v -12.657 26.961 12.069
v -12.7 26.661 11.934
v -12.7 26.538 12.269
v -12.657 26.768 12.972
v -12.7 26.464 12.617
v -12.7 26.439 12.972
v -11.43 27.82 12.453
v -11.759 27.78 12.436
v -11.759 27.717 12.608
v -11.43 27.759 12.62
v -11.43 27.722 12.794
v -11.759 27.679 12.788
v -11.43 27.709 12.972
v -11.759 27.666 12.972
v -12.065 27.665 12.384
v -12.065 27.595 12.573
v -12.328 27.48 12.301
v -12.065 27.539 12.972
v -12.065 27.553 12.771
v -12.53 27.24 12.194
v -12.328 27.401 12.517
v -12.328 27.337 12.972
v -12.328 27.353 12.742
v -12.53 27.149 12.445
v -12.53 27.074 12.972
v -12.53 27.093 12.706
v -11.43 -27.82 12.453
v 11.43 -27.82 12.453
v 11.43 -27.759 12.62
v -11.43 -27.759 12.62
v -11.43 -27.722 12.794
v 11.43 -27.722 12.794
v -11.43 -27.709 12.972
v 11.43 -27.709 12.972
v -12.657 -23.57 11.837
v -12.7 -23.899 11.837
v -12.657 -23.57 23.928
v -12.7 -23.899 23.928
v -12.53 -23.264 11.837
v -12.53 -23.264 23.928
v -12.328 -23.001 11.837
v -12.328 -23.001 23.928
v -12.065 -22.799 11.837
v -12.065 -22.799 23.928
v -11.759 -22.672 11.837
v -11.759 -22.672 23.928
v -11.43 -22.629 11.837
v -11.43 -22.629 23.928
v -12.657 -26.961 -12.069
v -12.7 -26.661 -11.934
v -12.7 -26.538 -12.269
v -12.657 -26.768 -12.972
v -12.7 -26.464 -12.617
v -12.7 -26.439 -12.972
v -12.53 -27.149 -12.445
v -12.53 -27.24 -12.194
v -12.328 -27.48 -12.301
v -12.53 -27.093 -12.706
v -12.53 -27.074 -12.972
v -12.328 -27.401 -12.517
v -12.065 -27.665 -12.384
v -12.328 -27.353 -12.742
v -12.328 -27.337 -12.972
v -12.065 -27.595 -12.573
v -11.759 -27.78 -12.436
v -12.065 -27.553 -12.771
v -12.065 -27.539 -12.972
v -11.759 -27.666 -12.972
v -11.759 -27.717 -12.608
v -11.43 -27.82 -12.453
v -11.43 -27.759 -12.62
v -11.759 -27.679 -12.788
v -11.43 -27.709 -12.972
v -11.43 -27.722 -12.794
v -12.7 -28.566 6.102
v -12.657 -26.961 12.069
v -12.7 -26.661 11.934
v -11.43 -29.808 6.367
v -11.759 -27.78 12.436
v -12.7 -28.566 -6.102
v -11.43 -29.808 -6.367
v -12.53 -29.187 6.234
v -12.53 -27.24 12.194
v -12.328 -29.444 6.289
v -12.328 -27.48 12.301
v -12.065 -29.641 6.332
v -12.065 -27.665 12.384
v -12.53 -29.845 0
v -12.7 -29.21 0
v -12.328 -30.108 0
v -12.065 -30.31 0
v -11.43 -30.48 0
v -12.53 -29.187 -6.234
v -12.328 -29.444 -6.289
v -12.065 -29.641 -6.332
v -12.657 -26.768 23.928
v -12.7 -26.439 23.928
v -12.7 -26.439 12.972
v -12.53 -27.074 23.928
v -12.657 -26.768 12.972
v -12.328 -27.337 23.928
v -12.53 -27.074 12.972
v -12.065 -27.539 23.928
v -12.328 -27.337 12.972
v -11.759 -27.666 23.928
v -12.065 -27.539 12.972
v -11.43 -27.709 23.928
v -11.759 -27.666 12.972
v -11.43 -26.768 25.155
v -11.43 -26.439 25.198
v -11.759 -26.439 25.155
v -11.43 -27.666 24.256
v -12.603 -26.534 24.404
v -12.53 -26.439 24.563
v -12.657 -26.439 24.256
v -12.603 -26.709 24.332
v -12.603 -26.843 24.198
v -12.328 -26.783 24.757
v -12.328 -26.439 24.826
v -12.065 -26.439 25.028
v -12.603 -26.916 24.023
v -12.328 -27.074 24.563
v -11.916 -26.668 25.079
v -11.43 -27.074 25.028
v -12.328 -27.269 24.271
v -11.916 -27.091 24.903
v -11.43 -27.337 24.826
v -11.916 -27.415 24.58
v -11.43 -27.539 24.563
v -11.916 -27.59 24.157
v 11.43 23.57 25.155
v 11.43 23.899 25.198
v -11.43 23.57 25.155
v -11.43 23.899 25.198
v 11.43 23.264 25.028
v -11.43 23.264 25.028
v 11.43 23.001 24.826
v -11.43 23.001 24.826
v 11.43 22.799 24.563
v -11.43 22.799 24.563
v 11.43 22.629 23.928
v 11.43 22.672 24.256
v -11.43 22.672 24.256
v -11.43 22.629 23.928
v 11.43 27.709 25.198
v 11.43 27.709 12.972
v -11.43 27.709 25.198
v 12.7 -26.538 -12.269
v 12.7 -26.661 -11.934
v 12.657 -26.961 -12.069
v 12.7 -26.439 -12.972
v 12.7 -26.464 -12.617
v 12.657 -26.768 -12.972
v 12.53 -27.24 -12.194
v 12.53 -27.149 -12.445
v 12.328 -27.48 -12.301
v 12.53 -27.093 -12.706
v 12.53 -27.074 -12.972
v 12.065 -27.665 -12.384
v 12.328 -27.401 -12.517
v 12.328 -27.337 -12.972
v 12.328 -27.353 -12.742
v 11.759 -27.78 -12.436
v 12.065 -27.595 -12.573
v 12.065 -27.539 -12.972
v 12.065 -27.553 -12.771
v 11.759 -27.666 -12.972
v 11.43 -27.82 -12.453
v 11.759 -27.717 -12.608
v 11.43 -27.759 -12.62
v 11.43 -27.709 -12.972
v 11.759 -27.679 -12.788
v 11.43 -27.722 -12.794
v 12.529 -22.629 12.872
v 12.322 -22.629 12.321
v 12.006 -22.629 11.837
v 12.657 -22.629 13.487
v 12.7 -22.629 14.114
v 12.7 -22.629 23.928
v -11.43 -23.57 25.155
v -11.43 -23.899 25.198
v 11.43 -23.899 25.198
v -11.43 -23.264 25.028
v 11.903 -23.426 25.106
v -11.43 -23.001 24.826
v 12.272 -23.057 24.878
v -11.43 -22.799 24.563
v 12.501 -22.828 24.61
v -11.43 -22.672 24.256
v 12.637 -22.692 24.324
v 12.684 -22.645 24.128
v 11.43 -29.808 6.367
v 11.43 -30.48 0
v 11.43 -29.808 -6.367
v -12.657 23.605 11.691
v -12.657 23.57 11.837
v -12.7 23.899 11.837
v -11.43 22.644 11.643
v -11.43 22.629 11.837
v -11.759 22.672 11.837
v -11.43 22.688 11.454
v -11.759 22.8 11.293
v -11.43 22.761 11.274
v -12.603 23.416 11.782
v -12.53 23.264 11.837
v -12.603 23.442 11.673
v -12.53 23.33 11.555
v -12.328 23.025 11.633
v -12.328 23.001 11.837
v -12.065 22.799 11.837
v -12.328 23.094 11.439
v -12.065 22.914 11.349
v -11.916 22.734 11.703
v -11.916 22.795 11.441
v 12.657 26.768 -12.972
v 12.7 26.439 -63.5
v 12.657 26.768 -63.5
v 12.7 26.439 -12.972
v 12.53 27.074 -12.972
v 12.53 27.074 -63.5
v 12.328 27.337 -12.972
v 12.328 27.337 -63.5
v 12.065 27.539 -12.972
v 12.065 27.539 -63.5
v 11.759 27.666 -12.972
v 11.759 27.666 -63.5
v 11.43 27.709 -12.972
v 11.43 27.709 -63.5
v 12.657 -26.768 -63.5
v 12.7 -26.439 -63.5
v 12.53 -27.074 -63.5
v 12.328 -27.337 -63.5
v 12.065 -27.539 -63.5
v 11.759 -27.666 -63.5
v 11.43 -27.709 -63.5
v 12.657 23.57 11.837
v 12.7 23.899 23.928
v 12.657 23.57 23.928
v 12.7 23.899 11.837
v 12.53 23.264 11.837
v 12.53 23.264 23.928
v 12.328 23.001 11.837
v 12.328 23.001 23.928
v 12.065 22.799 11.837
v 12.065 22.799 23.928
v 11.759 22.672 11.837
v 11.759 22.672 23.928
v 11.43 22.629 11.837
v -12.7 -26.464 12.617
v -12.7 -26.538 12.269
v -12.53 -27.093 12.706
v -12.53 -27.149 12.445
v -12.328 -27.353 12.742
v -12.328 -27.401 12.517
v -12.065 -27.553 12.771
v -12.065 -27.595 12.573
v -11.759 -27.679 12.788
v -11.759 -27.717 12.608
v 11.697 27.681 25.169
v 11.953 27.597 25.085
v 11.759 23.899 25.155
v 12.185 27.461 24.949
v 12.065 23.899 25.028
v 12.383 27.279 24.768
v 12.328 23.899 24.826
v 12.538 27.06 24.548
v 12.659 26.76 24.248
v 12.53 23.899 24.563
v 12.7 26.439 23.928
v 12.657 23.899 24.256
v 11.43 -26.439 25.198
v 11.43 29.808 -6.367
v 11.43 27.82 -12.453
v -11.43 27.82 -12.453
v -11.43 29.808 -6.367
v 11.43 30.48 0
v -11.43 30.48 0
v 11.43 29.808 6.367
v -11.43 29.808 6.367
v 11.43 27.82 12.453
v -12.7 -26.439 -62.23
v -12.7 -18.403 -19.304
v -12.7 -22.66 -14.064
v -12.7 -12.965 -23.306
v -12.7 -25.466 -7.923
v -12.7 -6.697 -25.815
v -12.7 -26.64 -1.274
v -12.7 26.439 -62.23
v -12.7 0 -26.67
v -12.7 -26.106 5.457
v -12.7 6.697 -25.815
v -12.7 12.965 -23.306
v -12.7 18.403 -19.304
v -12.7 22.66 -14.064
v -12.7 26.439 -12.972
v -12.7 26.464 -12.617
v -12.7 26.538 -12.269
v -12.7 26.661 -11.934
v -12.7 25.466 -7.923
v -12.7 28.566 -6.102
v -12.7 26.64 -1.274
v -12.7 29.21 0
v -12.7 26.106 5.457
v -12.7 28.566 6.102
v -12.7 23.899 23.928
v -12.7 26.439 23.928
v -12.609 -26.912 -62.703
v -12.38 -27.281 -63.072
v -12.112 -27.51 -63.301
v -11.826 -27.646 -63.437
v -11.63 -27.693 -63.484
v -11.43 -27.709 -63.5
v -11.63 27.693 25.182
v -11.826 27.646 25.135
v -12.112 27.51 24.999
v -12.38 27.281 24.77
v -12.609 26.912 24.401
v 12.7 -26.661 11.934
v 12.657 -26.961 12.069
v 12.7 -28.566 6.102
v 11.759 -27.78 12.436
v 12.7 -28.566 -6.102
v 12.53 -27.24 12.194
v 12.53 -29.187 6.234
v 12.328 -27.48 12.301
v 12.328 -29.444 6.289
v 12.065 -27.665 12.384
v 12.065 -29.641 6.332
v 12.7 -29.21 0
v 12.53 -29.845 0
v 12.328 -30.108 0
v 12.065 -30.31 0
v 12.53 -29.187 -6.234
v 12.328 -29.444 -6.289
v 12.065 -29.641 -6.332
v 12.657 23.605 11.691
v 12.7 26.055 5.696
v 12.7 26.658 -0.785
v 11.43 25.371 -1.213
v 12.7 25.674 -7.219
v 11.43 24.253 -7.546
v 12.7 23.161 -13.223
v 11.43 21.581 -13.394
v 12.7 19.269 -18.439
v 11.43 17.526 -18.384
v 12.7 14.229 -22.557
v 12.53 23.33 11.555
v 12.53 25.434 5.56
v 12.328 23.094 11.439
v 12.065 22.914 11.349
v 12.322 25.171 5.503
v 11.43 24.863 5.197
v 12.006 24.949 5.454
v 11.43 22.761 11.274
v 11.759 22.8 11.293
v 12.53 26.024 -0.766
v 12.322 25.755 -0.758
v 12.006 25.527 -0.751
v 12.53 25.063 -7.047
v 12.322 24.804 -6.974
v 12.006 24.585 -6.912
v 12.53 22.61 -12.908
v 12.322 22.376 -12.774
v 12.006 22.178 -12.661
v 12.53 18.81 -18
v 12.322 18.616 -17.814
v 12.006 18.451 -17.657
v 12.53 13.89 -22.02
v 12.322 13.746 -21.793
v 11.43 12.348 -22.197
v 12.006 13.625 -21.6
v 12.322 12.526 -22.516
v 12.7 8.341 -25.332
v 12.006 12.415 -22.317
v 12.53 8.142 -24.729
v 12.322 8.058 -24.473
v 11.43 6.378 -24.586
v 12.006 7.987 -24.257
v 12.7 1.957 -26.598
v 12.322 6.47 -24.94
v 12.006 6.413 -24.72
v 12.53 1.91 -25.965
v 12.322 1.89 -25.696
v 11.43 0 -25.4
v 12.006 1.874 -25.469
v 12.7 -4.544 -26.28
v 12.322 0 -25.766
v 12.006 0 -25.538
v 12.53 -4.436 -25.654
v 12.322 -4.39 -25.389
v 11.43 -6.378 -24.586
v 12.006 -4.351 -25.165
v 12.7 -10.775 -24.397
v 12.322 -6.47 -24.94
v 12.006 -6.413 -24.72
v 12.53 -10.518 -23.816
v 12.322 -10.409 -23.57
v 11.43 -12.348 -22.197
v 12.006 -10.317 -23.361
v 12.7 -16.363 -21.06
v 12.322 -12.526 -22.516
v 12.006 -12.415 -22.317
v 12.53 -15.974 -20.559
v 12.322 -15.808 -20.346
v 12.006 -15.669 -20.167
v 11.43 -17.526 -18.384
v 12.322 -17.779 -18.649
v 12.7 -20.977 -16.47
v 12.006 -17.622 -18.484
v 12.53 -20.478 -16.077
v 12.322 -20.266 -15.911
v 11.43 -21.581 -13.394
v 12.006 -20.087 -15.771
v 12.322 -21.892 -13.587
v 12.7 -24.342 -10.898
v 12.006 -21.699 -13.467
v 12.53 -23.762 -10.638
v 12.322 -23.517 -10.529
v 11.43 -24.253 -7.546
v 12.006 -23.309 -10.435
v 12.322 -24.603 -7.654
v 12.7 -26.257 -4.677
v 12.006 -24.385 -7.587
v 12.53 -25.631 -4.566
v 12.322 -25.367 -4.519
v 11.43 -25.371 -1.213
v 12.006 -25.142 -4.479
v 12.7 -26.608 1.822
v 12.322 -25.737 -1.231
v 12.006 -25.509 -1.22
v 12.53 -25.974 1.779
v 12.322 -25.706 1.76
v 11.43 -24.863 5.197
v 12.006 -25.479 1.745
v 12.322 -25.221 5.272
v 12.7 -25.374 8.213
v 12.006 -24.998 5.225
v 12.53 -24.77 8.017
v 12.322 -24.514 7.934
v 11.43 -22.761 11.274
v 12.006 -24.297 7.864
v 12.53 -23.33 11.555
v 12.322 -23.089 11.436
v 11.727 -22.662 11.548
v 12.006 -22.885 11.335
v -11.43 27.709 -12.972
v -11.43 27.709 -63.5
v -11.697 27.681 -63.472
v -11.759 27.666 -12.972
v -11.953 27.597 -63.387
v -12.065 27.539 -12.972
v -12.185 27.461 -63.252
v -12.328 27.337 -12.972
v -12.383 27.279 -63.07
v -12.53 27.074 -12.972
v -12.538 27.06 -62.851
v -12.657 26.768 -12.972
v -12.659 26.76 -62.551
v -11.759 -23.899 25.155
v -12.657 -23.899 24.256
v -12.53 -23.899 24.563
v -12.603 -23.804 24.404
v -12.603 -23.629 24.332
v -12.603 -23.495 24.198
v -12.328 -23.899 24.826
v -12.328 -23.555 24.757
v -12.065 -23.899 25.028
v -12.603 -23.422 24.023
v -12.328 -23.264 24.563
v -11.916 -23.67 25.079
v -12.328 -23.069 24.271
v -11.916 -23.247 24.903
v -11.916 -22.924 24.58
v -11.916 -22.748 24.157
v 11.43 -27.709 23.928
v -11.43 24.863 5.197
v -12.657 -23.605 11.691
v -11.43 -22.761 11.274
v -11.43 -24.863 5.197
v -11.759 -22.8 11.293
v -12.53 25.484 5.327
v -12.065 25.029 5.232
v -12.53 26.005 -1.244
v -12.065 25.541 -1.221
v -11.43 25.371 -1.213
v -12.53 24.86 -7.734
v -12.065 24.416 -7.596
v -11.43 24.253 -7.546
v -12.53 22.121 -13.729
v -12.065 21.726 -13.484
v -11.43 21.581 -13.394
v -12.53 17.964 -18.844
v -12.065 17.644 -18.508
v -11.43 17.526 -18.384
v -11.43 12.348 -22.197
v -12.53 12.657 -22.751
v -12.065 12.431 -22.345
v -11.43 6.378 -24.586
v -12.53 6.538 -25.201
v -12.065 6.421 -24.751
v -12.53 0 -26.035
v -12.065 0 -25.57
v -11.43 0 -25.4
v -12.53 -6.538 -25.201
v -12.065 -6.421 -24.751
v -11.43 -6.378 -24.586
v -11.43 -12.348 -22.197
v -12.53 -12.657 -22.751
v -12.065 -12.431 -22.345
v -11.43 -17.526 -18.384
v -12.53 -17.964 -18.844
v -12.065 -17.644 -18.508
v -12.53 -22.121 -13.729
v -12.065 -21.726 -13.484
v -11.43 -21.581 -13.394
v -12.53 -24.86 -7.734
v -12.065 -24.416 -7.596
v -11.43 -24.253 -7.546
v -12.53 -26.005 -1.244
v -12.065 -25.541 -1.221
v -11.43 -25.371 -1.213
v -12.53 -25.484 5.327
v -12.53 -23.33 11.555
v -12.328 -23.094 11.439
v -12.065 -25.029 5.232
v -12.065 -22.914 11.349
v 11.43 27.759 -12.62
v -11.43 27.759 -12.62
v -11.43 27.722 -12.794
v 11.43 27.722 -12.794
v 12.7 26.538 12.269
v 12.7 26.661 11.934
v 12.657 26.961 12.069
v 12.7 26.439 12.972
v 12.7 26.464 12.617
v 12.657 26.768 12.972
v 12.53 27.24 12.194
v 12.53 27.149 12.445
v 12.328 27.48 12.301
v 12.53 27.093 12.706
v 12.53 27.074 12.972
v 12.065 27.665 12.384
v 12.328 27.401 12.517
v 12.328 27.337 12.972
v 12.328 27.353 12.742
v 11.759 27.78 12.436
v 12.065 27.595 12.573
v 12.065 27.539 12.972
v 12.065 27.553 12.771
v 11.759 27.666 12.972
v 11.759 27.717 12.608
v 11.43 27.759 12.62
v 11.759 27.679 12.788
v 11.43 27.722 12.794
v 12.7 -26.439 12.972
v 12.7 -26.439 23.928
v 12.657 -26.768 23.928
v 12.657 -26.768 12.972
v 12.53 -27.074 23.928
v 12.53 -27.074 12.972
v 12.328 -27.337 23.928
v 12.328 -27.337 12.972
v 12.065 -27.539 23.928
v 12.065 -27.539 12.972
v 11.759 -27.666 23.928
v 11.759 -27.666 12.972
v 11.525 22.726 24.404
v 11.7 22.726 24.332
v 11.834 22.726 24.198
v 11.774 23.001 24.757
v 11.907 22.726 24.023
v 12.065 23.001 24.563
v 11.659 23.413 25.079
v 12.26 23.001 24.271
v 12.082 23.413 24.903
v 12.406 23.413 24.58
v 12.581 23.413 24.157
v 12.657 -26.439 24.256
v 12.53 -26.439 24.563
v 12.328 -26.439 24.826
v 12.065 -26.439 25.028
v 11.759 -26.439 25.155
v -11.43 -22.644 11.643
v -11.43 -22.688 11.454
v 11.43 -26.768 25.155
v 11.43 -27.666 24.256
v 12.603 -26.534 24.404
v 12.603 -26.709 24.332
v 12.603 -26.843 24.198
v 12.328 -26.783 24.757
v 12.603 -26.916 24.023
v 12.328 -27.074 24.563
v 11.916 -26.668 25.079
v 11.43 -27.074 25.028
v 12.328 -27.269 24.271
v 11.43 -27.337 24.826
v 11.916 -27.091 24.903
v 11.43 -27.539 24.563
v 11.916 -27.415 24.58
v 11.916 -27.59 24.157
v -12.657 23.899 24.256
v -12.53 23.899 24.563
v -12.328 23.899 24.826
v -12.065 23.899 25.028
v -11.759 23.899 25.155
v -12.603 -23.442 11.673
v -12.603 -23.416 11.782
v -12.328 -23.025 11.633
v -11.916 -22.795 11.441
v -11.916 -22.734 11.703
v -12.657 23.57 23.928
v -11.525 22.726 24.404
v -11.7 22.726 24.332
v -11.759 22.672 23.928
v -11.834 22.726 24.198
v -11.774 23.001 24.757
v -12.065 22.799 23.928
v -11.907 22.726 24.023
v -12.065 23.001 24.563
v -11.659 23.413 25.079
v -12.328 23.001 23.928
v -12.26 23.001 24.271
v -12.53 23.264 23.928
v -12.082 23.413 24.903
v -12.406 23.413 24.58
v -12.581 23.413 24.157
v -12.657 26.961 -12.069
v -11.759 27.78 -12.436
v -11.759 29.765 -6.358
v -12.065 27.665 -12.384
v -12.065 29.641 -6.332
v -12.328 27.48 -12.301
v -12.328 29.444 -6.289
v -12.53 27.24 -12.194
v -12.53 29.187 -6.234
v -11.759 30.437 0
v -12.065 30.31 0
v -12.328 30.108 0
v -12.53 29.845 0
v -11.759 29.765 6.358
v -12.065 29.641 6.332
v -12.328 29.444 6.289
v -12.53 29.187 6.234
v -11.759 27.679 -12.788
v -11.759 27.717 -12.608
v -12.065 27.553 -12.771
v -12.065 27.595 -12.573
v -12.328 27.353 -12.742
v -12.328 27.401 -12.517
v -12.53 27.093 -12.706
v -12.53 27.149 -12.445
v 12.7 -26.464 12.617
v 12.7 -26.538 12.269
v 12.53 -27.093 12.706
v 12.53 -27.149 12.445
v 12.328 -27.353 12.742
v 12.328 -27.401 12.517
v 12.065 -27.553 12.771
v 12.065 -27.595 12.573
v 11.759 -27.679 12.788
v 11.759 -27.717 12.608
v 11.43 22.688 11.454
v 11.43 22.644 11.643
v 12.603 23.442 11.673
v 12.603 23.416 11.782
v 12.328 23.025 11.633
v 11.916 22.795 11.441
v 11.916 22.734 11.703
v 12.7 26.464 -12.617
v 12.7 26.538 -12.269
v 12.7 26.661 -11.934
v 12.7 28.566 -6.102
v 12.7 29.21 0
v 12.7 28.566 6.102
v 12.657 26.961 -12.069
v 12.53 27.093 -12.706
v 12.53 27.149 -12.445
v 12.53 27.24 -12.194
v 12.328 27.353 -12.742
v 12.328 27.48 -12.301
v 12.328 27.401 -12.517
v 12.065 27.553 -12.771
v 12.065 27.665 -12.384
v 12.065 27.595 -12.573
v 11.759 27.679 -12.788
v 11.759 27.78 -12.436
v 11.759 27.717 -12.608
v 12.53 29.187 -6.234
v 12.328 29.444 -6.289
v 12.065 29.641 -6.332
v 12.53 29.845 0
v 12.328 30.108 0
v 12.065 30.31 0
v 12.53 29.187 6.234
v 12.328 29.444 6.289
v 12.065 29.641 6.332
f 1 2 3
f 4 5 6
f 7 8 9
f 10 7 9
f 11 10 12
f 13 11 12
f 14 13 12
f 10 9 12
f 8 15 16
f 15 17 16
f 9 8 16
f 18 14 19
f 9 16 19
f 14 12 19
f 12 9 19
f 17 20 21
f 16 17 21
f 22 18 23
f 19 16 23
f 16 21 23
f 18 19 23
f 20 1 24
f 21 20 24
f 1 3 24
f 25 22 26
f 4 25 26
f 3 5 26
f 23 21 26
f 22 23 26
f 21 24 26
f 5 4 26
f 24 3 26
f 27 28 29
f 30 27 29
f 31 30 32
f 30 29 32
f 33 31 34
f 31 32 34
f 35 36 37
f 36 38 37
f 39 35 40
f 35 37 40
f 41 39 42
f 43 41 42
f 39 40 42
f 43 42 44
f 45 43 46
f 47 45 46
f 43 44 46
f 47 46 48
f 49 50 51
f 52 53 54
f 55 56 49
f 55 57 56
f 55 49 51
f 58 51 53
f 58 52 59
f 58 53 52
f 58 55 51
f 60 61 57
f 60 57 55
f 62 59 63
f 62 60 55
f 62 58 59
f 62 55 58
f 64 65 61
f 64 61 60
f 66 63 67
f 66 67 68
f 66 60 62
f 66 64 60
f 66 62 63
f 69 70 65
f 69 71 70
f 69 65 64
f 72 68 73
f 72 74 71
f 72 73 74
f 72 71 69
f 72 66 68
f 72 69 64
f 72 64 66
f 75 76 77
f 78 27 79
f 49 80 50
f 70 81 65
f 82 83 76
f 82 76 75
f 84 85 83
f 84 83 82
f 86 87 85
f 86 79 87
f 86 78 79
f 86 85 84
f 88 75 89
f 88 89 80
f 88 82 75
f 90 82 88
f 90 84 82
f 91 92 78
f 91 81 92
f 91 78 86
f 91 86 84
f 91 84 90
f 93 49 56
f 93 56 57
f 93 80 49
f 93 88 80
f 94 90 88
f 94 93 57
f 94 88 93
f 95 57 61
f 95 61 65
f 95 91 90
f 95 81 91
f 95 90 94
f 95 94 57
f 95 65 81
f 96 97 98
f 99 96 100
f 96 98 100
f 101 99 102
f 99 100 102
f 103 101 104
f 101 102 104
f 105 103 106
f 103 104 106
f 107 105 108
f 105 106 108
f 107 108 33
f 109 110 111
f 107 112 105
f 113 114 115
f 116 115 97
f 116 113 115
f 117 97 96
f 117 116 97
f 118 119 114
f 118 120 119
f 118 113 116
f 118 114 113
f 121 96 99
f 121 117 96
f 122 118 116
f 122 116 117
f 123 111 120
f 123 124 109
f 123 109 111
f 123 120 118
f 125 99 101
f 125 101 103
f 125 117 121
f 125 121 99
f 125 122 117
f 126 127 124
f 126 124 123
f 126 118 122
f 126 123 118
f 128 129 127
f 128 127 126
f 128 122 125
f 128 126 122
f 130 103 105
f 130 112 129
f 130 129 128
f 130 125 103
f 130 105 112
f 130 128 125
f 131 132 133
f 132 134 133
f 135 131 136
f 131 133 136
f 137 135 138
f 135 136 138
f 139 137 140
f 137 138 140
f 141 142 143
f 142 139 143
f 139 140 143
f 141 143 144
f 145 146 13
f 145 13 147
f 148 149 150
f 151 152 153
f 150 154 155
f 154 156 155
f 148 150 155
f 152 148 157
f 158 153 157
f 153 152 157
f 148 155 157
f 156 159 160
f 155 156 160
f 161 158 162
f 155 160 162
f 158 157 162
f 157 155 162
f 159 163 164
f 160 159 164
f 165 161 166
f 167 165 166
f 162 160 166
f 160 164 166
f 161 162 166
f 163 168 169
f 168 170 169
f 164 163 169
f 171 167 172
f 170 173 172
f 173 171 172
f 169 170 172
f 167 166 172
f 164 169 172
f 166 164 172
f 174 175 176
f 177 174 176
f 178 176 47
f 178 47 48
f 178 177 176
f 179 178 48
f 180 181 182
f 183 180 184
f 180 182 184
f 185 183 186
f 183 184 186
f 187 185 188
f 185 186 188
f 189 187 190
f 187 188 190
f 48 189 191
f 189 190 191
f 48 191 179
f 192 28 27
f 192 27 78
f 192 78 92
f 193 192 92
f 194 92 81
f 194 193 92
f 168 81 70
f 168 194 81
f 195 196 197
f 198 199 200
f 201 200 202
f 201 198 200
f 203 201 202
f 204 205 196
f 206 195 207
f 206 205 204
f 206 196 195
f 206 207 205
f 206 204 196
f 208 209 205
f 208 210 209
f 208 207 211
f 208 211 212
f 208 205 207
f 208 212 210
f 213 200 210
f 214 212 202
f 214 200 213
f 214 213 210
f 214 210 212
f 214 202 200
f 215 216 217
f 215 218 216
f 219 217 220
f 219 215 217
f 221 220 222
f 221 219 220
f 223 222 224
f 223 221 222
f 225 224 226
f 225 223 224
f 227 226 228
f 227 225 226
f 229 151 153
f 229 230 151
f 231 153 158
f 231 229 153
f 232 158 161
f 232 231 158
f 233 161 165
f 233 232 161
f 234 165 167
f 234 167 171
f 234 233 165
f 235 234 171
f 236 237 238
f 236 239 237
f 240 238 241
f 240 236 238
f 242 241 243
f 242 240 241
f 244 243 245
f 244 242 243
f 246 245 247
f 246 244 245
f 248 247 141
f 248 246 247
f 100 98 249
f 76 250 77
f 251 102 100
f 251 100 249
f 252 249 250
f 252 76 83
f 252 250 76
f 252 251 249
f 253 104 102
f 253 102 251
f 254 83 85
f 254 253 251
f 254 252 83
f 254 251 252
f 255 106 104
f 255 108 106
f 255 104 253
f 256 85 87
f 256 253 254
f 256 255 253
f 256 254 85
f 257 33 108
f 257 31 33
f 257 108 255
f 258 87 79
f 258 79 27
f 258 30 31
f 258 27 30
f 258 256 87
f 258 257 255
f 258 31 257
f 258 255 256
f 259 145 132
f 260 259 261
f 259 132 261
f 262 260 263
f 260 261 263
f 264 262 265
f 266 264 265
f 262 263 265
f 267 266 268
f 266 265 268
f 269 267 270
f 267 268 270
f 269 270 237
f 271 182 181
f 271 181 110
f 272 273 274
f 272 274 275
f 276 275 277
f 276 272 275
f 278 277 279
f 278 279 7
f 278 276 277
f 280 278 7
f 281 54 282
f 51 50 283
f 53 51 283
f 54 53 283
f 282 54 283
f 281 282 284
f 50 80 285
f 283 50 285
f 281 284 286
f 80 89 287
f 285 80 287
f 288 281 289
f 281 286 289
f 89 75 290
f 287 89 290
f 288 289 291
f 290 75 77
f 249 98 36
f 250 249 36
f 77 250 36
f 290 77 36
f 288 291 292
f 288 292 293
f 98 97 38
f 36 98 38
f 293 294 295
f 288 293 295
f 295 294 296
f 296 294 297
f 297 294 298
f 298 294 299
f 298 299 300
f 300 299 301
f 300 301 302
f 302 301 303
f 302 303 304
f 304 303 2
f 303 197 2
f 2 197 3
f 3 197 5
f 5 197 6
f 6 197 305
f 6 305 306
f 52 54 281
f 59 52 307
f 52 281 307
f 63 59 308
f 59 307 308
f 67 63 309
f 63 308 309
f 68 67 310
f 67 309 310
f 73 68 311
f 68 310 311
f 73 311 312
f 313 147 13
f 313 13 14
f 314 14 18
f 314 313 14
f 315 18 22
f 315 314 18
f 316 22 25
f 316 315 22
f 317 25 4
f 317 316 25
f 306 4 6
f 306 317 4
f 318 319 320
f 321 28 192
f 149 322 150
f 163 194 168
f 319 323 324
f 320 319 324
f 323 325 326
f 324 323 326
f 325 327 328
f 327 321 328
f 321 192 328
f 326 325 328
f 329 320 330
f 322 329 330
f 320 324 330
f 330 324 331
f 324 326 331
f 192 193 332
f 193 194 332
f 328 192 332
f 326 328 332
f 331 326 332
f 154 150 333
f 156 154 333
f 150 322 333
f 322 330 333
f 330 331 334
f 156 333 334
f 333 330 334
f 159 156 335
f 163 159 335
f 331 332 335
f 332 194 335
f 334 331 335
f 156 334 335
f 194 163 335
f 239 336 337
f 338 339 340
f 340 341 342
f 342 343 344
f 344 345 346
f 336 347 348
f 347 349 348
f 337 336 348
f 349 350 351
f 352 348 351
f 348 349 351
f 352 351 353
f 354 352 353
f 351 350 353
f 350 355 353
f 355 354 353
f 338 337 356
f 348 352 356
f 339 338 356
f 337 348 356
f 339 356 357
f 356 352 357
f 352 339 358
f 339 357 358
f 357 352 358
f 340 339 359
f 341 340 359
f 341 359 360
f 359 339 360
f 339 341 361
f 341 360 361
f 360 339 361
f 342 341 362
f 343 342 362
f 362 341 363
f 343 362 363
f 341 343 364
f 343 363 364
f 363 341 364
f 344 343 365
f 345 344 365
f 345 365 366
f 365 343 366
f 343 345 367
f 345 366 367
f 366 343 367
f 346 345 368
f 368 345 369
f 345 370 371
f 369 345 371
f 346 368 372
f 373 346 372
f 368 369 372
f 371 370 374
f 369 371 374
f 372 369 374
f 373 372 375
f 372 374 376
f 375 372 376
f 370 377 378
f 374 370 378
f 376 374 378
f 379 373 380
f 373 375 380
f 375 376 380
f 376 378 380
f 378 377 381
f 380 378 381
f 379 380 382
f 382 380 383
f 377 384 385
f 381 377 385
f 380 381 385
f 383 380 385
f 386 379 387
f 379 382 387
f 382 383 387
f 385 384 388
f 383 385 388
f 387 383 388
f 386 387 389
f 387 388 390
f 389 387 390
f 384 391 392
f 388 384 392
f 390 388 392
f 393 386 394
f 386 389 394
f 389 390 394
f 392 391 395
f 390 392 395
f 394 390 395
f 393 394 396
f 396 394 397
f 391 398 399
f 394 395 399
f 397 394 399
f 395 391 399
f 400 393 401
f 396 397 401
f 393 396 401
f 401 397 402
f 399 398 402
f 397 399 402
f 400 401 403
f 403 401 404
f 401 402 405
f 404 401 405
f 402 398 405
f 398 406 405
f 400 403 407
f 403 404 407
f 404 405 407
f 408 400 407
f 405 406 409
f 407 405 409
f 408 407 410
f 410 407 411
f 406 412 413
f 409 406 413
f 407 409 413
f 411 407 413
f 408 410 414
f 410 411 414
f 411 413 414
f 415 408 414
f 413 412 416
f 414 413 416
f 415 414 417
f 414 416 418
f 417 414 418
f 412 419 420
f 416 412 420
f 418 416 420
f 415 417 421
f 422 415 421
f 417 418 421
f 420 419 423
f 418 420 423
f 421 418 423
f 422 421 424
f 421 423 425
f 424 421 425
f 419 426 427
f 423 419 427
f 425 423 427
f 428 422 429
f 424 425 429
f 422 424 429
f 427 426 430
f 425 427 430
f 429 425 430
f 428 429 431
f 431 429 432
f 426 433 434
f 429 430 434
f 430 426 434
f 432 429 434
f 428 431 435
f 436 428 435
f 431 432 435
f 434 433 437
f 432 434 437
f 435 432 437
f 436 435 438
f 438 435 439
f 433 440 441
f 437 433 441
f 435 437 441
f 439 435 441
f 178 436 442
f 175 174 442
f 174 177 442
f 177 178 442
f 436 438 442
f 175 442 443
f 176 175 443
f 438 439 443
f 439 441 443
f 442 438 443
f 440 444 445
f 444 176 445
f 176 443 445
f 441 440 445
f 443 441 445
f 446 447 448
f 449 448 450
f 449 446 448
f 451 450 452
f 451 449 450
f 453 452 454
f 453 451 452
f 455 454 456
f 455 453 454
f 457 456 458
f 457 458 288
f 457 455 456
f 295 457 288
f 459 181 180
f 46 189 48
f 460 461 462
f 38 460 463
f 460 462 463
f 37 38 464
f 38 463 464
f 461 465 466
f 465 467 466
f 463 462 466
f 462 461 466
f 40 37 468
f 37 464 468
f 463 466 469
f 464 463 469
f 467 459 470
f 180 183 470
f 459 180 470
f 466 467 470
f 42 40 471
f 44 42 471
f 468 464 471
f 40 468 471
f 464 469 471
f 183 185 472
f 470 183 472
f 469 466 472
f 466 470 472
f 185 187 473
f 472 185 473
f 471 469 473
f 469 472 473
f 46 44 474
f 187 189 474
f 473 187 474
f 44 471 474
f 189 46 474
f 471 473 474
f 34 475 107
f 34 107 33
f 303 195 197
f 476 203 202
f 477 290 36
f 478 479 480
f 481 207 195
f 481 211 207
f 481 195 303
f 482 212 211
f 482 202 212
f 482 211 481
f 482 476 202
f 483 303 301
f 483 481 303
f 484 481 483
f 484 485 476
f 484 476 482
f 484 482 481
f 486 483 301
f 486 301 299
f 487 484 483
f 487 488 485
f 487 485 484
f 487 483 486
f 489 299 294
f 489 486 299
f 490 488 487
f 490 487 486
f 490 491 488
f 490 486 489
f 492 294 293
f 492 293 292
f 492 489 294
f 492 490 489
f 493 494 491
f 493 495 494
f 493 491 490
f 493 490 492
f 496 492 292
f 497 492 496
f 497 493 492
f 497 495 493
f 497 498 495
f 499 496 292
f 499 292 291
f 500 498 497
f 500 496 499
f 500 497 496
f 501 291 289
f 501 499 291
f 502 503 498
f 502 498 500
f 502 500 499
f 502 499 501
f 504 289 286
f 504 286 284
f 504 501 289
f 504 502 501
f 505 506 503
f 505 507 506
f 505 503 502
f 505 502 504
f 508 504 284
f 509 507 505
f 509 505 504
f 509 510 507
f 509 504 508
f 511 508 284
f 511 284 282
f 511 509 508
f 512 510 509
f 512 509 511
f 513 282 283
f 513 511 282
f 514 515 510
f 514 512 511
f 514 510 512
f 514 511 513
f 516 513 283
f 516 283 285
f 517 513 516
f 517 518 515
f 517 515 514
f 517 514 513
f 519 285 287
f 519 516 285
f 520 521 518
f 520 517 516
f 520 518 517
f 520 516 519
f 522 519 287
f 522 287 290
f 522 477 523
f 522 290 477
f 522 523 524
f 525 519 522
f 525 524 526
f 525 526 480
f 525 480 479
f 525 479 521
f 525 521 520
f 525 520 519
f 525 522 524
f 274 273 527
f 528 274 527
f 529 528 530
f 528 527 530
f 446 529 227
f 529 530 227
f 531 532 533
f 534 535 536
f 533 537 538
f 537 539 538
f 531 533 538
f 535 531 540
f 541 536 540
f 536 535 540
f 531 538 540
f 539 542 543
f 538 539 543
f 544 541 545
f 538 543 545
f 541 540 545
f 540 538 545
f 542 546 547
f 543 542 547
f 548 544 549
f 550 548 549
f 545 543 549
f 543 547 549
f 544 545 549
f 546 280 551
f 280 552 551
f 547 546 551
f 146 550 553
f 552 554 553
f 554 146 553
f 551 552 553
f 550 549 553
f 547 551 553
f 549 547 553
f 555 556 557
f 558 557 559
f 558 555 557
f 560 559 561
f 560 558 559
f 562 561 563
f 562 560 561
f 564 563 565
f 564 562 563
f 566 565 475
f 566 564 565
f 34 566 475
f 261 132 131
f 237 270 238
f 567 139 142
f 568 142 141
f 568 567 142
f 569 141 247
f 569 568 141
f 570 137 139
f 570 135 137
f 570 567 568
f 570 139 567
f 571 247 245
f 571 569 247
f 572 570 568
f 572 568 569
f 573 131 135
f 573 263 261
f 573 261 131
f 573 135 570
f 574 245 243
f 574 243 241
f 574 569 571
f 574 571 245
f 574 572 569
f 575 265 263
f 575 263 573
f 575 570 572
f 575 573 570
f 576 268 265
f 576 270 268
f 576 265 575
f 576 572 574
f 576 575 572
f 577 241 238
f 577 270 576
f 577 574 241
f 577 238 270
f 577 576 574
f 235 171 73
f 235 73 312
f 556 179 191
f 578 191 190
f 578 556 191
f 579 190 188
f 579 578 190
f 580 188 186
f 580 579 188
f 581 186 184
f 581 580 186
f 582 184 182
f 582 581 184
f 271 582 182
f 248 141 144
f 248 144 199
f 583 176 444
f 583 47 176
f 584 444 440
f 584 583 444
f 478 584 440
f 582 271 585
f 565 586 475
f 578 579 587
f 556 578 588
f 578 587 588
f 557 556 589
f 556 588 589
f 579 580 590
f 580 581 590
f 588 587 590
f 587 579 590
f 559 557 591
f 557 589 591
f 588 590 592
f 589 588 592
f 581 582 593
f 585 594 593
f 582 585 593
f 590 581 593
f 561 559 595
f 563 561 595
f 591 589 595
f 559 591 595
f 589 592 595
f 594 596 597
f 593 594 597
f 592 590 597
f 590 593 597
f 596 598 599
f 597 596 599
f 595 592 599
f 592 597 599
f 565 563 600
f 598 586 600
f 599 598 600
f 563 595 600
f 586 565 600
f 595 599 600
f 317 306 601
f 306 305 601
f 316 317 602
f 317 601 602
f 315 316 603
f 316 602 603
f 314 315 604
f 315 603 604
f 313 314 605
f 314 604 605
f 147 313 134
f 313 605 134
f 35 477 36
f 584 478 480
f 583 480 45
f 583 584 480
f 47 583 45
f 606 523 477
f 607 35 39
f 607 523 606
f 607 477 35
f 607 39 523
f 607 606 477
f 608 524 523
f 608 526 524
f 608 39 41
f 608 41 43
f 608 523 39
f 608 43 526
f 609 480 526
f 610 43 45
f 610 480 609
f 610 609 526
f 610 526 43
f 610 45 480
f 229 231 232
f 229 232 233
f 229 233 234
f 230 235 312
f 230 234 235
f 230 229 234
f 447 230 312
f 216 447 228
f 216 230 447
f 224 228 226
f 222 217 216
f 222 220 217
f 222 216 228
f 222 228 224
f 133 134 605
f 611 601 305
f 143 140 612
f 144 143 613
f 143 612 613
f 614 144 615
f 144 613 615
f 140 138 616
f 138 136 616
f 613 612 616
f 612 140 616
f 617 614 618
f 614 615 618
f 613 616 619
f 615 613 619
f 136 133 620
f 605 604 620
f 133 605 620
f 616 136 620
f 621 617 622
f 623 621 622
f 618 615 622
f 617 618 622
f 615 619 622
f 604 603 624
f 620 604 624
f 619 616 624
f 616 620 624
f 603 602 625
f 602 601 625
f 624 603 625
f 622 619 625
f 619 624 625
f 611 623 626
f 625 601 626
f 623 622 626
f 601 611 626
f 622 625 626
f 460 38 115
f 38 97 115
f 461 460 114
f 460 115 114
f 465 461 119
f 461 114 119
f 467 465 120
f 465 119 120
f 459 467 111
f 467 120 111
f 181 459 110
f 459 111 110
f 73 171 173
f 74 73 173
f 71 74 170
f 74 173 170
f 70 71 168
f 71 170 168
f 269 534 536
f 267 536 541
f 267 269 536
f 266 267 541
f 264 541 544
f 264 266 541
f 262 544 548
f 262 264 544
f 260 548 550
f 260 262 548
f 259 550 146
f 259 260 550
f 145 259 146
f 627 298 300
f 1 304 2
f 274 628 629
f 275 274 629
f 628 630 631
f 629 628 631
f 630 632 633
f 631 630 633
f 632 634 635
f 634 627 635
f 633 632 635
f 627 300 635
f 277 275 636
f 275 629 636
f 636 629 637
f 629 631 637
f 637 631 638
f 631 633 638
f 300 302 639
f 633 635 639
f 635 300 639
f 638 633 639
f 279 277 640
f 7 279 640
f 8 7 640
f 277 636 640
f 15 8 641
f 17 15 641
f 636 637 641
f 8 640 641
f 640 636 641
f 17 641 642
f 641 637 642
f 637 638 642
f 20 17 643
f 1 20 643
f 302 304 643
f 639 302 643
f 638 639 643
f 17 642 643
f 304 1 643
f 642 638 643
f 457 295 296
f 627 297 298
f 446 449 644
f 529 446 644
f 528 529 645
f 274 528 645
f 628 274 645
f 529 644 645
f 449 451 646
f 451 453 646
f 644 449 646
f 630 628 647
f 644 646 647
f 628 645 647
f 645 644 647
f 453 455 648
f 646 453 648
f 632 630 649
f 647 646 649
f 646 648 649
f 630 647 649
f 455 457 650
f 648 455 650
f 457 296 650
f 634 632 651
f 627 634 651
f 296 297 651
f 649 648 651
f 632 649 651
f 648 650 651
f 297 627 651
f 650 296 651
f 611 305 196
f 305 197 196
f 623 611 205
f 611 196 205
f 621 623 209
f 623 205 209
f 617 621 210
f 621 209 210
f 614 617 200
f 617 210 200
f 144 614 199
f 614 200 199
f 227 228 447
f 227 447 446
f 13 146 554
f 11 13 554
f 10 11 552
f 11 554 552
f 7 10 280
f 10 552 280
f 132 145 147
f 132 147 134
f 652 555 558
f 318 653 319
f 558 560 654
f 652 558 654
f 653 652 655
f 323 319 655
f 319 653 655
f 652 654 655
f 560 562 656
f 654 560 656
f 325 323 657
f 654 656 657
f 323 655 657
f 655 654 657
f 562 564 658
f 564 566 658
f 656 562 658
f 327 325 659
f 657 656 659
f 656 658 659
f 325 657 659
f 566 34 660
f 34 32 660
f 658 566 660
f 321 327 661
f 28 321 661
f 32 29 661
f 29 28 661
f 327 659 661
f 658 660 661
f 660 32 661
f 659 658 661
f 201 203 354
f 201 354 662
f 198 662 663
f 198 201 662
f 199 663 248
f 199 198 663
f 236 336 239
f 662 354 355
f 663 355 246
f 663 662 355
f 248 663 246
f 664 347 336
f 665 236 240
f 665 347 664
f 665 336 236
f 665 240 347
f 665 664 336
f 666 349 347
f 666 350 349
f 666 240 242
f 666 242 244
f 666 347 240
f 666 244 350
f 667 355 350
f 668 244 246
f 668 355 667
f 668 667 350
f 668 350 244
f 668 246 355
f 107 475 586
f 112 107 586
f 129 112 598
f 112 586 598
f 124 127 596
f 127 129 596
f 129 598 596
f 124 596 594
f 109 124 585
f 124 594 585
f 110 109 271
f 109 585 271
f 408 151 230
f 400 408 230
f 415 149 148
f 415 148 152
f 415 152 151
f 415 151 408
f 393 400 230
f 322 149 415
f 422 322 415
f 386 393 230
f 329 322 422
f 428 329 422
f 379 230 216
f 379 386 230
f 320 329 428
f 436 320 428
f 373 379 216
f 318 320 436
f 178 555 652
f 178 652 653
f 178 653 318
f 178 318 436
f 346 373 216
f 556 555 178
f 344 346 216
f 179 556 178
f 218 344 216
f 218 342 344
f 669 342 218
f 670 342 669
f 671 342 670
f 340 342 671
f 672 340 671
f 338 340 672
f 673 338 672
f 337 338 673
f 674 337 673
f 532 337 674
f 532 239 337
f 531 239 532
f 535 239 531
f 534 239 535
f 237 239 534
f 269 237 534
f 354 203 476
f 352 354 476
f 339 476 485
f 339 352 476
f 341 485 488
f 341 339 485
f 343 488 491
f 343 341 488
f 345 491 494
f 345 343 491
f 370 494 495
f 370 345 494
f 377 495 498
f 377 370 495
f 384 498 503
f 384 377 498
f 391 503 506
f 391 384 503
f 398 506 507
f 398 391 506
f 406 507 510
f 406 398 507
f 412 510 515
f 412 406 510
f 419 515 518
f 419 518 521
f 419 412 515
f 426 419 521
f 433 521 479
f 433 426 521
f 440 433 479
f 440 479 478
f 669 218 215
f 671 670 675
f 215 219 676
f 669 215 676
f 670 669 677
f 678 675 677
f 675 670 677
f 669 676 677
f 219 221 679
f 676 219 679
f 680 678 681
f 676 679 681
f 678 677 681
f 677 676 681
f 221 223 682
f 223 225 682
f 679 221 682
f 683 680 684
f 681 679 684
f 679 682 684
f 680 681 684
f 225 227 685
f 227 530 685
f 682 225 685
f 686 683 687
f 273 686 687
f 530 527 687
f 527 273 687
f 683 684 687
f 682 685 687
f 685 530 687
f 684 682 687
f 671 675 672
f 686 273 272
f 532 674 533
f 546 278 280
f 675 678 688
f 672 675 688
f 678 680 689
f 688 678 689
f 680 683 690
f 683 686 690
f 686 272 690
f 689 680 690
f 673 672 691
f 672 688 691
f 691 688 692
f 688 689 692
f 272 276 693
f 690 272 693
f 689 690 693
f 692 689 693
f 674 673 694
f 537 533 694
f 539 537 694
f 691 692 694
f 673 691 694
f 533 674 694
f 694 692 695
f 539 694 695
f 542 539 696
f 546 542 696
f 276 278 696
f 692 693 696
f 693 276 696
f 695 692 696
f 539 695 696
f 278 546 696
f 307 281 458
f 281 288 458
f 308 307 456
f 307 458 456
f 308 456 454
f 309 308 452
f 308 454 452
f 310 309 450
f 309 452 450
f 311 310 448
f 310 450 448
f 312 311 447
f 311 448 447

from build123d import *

# Parameters (mm, degrees)
F1_DEPTH = 12.7
F2_F1_R  = 1.27
F2_F2_R  = 1.27


with BuildPart() as f1:
    # F0 (on Right) → F1 (new body, symmetric)
    with BuildSketch(Plane.YZ):
        with BuildLine():
            ThreePointArc((-22.86, -11.0716033166), (-25.3986752482, 0.259414025), (-22.6290909091, 11.5362144843))
            Line((-22.6290909091, 11.5362144843), (-22.6290909091, 25.197786356))
            Line((-22.6290909091, 25.197786356), (-27.7090909091, 25.197786356))
            Line((-27.7090909091, 25.197786356), (-27.7090909091, 12.6979006529))
            ThreePointArc((-27.7090909091, 12.6979006529), (-30.48, 0), (-27.7090909091, -12.6979006529))
            Line((-27.7090909091, -12.6979006529), (-27.7090909091, -63.5))
            Line((-27.7090909091, -63.5), (-22.86, -63.5))
            Line((-22.86, -63.5), (22.86, -63.5))
            Line((22.86, -63.5), (27.7090909091, -63.5))
            Line((27.7090909091, -63.5), (27.7090909091, -12.6979006529))
            ThreePointArc((27.7090909091, -12.6979006529), (30.48, 0), (27.7090909091, 12.6979006529))
            Line((27.7090909091, 12.6979006529), (27.7090909091, 25.197786356))
            Line((27.7090909091, 25.197786356), (22.6290909091, 25.197786356))
            Line((22.6290909091, 25.197786356), (22.6290909091, 11.5362144843))
            ThreePointArc((22.6290909091, 11.5362144843), (25.3986752482, 0.259414025), (22.86, -11.0716033166))
            ThreePointArc((22.86, -11.0716033166), (0, -25.4), (-22.86, -11.0716033166))
        make_face()
    extrude(amount=F1_DEPTH, both=True)

    # F2: fillet of radius 1.27 on 31 edges, made by hand

    # F2_f1
    f2_f1_edges = [f1.edges().sort_by_distance(p)[0] for p in [
        (0, 27.7090909091, 12.6979006529),
        (0, 27.7090909091, -12.6979006529),
        (0, -27.7090909091, 12.6979006529),
        (0, -27.7090909091, -12.6979006529),
    ]]
    fillet(f2_f1_edges, radius=F2_F1_R)

    # F2_f2
    f2_f2_edges = [f1.edges().sort_by_distance(p)[0] for p in [
        (0, -22.6290909091, 25.197786356),
        (0, -27.7090909091, 25.197786356),
        (-12.7, -25.1690909091, 25.197786356),
        (12.7, -25.1690909091, 25.197786356),
        (12.7, 25.1690909091, 25.197786356),
        (-12.7, 25.1690909091, 25.197786356),
        (0, 22.6290909091, 25.197786356),
        (-6.35, -22.6290909091, 11.5362144843),
        (6.35, -22.6290909091, 11.5362144843),
        (-6.35, 22.6290909091, 11.5362144843),
        (6.35, 22.6290909091, 11.5362144843),
        (-12.7, -27.7090909091, -38.2360386617),
        (-12.7, 27.7090909091, 19.0849318397),
        (-12.7, 22.6290909091, 18.3670004202),
        (-12.7, 25.3986752482, 0.259414025),
        (-12.7, 0, -25.4),
        (-12.7, -25.3986752482, 0.259414025),
        (-12.7, -22.6290909091, 18.3670004202),
        (-12.7, -27.7090909091, 19.0849318397),
        (-12.7, -30.48, 0),
        (-12.7, 0, -63.5),
        (-12.7, 27.7090909091, -38.2360386617),
        (-12.7, 30.48, 0),
        (12.7, -30.48, 0),
        (12.7, 0, -25.4),
        (12.7, 30.48, 0),
        (12.7, 22.6290909091, 18.3670004202),
        (12.7, 25.3986752482, 0.259414025),
        (12.7, -25.3986752482, 0.259414025),
        (12.7, 27.7371090618, -12.7067829757),
        (12.7, 27.7371090618, 12.7067829757),
        (12.7, -27.7371090618, 12.7067829757),
        (12.7, -27.7371090618, -12.7067829757),
        (-12.7, 27.7371090618, -12.7067829757),
        (-12.7, 27.7371090618, 12.7067829757),
        (-12.7, -27.7371090618, 12.7067829757),
        (-12.7, -27.7371090618, -12.7067829757),
    ]]
    fillet(f2_f2_edges, radius=F2_F2_R)


solid = f1.part
